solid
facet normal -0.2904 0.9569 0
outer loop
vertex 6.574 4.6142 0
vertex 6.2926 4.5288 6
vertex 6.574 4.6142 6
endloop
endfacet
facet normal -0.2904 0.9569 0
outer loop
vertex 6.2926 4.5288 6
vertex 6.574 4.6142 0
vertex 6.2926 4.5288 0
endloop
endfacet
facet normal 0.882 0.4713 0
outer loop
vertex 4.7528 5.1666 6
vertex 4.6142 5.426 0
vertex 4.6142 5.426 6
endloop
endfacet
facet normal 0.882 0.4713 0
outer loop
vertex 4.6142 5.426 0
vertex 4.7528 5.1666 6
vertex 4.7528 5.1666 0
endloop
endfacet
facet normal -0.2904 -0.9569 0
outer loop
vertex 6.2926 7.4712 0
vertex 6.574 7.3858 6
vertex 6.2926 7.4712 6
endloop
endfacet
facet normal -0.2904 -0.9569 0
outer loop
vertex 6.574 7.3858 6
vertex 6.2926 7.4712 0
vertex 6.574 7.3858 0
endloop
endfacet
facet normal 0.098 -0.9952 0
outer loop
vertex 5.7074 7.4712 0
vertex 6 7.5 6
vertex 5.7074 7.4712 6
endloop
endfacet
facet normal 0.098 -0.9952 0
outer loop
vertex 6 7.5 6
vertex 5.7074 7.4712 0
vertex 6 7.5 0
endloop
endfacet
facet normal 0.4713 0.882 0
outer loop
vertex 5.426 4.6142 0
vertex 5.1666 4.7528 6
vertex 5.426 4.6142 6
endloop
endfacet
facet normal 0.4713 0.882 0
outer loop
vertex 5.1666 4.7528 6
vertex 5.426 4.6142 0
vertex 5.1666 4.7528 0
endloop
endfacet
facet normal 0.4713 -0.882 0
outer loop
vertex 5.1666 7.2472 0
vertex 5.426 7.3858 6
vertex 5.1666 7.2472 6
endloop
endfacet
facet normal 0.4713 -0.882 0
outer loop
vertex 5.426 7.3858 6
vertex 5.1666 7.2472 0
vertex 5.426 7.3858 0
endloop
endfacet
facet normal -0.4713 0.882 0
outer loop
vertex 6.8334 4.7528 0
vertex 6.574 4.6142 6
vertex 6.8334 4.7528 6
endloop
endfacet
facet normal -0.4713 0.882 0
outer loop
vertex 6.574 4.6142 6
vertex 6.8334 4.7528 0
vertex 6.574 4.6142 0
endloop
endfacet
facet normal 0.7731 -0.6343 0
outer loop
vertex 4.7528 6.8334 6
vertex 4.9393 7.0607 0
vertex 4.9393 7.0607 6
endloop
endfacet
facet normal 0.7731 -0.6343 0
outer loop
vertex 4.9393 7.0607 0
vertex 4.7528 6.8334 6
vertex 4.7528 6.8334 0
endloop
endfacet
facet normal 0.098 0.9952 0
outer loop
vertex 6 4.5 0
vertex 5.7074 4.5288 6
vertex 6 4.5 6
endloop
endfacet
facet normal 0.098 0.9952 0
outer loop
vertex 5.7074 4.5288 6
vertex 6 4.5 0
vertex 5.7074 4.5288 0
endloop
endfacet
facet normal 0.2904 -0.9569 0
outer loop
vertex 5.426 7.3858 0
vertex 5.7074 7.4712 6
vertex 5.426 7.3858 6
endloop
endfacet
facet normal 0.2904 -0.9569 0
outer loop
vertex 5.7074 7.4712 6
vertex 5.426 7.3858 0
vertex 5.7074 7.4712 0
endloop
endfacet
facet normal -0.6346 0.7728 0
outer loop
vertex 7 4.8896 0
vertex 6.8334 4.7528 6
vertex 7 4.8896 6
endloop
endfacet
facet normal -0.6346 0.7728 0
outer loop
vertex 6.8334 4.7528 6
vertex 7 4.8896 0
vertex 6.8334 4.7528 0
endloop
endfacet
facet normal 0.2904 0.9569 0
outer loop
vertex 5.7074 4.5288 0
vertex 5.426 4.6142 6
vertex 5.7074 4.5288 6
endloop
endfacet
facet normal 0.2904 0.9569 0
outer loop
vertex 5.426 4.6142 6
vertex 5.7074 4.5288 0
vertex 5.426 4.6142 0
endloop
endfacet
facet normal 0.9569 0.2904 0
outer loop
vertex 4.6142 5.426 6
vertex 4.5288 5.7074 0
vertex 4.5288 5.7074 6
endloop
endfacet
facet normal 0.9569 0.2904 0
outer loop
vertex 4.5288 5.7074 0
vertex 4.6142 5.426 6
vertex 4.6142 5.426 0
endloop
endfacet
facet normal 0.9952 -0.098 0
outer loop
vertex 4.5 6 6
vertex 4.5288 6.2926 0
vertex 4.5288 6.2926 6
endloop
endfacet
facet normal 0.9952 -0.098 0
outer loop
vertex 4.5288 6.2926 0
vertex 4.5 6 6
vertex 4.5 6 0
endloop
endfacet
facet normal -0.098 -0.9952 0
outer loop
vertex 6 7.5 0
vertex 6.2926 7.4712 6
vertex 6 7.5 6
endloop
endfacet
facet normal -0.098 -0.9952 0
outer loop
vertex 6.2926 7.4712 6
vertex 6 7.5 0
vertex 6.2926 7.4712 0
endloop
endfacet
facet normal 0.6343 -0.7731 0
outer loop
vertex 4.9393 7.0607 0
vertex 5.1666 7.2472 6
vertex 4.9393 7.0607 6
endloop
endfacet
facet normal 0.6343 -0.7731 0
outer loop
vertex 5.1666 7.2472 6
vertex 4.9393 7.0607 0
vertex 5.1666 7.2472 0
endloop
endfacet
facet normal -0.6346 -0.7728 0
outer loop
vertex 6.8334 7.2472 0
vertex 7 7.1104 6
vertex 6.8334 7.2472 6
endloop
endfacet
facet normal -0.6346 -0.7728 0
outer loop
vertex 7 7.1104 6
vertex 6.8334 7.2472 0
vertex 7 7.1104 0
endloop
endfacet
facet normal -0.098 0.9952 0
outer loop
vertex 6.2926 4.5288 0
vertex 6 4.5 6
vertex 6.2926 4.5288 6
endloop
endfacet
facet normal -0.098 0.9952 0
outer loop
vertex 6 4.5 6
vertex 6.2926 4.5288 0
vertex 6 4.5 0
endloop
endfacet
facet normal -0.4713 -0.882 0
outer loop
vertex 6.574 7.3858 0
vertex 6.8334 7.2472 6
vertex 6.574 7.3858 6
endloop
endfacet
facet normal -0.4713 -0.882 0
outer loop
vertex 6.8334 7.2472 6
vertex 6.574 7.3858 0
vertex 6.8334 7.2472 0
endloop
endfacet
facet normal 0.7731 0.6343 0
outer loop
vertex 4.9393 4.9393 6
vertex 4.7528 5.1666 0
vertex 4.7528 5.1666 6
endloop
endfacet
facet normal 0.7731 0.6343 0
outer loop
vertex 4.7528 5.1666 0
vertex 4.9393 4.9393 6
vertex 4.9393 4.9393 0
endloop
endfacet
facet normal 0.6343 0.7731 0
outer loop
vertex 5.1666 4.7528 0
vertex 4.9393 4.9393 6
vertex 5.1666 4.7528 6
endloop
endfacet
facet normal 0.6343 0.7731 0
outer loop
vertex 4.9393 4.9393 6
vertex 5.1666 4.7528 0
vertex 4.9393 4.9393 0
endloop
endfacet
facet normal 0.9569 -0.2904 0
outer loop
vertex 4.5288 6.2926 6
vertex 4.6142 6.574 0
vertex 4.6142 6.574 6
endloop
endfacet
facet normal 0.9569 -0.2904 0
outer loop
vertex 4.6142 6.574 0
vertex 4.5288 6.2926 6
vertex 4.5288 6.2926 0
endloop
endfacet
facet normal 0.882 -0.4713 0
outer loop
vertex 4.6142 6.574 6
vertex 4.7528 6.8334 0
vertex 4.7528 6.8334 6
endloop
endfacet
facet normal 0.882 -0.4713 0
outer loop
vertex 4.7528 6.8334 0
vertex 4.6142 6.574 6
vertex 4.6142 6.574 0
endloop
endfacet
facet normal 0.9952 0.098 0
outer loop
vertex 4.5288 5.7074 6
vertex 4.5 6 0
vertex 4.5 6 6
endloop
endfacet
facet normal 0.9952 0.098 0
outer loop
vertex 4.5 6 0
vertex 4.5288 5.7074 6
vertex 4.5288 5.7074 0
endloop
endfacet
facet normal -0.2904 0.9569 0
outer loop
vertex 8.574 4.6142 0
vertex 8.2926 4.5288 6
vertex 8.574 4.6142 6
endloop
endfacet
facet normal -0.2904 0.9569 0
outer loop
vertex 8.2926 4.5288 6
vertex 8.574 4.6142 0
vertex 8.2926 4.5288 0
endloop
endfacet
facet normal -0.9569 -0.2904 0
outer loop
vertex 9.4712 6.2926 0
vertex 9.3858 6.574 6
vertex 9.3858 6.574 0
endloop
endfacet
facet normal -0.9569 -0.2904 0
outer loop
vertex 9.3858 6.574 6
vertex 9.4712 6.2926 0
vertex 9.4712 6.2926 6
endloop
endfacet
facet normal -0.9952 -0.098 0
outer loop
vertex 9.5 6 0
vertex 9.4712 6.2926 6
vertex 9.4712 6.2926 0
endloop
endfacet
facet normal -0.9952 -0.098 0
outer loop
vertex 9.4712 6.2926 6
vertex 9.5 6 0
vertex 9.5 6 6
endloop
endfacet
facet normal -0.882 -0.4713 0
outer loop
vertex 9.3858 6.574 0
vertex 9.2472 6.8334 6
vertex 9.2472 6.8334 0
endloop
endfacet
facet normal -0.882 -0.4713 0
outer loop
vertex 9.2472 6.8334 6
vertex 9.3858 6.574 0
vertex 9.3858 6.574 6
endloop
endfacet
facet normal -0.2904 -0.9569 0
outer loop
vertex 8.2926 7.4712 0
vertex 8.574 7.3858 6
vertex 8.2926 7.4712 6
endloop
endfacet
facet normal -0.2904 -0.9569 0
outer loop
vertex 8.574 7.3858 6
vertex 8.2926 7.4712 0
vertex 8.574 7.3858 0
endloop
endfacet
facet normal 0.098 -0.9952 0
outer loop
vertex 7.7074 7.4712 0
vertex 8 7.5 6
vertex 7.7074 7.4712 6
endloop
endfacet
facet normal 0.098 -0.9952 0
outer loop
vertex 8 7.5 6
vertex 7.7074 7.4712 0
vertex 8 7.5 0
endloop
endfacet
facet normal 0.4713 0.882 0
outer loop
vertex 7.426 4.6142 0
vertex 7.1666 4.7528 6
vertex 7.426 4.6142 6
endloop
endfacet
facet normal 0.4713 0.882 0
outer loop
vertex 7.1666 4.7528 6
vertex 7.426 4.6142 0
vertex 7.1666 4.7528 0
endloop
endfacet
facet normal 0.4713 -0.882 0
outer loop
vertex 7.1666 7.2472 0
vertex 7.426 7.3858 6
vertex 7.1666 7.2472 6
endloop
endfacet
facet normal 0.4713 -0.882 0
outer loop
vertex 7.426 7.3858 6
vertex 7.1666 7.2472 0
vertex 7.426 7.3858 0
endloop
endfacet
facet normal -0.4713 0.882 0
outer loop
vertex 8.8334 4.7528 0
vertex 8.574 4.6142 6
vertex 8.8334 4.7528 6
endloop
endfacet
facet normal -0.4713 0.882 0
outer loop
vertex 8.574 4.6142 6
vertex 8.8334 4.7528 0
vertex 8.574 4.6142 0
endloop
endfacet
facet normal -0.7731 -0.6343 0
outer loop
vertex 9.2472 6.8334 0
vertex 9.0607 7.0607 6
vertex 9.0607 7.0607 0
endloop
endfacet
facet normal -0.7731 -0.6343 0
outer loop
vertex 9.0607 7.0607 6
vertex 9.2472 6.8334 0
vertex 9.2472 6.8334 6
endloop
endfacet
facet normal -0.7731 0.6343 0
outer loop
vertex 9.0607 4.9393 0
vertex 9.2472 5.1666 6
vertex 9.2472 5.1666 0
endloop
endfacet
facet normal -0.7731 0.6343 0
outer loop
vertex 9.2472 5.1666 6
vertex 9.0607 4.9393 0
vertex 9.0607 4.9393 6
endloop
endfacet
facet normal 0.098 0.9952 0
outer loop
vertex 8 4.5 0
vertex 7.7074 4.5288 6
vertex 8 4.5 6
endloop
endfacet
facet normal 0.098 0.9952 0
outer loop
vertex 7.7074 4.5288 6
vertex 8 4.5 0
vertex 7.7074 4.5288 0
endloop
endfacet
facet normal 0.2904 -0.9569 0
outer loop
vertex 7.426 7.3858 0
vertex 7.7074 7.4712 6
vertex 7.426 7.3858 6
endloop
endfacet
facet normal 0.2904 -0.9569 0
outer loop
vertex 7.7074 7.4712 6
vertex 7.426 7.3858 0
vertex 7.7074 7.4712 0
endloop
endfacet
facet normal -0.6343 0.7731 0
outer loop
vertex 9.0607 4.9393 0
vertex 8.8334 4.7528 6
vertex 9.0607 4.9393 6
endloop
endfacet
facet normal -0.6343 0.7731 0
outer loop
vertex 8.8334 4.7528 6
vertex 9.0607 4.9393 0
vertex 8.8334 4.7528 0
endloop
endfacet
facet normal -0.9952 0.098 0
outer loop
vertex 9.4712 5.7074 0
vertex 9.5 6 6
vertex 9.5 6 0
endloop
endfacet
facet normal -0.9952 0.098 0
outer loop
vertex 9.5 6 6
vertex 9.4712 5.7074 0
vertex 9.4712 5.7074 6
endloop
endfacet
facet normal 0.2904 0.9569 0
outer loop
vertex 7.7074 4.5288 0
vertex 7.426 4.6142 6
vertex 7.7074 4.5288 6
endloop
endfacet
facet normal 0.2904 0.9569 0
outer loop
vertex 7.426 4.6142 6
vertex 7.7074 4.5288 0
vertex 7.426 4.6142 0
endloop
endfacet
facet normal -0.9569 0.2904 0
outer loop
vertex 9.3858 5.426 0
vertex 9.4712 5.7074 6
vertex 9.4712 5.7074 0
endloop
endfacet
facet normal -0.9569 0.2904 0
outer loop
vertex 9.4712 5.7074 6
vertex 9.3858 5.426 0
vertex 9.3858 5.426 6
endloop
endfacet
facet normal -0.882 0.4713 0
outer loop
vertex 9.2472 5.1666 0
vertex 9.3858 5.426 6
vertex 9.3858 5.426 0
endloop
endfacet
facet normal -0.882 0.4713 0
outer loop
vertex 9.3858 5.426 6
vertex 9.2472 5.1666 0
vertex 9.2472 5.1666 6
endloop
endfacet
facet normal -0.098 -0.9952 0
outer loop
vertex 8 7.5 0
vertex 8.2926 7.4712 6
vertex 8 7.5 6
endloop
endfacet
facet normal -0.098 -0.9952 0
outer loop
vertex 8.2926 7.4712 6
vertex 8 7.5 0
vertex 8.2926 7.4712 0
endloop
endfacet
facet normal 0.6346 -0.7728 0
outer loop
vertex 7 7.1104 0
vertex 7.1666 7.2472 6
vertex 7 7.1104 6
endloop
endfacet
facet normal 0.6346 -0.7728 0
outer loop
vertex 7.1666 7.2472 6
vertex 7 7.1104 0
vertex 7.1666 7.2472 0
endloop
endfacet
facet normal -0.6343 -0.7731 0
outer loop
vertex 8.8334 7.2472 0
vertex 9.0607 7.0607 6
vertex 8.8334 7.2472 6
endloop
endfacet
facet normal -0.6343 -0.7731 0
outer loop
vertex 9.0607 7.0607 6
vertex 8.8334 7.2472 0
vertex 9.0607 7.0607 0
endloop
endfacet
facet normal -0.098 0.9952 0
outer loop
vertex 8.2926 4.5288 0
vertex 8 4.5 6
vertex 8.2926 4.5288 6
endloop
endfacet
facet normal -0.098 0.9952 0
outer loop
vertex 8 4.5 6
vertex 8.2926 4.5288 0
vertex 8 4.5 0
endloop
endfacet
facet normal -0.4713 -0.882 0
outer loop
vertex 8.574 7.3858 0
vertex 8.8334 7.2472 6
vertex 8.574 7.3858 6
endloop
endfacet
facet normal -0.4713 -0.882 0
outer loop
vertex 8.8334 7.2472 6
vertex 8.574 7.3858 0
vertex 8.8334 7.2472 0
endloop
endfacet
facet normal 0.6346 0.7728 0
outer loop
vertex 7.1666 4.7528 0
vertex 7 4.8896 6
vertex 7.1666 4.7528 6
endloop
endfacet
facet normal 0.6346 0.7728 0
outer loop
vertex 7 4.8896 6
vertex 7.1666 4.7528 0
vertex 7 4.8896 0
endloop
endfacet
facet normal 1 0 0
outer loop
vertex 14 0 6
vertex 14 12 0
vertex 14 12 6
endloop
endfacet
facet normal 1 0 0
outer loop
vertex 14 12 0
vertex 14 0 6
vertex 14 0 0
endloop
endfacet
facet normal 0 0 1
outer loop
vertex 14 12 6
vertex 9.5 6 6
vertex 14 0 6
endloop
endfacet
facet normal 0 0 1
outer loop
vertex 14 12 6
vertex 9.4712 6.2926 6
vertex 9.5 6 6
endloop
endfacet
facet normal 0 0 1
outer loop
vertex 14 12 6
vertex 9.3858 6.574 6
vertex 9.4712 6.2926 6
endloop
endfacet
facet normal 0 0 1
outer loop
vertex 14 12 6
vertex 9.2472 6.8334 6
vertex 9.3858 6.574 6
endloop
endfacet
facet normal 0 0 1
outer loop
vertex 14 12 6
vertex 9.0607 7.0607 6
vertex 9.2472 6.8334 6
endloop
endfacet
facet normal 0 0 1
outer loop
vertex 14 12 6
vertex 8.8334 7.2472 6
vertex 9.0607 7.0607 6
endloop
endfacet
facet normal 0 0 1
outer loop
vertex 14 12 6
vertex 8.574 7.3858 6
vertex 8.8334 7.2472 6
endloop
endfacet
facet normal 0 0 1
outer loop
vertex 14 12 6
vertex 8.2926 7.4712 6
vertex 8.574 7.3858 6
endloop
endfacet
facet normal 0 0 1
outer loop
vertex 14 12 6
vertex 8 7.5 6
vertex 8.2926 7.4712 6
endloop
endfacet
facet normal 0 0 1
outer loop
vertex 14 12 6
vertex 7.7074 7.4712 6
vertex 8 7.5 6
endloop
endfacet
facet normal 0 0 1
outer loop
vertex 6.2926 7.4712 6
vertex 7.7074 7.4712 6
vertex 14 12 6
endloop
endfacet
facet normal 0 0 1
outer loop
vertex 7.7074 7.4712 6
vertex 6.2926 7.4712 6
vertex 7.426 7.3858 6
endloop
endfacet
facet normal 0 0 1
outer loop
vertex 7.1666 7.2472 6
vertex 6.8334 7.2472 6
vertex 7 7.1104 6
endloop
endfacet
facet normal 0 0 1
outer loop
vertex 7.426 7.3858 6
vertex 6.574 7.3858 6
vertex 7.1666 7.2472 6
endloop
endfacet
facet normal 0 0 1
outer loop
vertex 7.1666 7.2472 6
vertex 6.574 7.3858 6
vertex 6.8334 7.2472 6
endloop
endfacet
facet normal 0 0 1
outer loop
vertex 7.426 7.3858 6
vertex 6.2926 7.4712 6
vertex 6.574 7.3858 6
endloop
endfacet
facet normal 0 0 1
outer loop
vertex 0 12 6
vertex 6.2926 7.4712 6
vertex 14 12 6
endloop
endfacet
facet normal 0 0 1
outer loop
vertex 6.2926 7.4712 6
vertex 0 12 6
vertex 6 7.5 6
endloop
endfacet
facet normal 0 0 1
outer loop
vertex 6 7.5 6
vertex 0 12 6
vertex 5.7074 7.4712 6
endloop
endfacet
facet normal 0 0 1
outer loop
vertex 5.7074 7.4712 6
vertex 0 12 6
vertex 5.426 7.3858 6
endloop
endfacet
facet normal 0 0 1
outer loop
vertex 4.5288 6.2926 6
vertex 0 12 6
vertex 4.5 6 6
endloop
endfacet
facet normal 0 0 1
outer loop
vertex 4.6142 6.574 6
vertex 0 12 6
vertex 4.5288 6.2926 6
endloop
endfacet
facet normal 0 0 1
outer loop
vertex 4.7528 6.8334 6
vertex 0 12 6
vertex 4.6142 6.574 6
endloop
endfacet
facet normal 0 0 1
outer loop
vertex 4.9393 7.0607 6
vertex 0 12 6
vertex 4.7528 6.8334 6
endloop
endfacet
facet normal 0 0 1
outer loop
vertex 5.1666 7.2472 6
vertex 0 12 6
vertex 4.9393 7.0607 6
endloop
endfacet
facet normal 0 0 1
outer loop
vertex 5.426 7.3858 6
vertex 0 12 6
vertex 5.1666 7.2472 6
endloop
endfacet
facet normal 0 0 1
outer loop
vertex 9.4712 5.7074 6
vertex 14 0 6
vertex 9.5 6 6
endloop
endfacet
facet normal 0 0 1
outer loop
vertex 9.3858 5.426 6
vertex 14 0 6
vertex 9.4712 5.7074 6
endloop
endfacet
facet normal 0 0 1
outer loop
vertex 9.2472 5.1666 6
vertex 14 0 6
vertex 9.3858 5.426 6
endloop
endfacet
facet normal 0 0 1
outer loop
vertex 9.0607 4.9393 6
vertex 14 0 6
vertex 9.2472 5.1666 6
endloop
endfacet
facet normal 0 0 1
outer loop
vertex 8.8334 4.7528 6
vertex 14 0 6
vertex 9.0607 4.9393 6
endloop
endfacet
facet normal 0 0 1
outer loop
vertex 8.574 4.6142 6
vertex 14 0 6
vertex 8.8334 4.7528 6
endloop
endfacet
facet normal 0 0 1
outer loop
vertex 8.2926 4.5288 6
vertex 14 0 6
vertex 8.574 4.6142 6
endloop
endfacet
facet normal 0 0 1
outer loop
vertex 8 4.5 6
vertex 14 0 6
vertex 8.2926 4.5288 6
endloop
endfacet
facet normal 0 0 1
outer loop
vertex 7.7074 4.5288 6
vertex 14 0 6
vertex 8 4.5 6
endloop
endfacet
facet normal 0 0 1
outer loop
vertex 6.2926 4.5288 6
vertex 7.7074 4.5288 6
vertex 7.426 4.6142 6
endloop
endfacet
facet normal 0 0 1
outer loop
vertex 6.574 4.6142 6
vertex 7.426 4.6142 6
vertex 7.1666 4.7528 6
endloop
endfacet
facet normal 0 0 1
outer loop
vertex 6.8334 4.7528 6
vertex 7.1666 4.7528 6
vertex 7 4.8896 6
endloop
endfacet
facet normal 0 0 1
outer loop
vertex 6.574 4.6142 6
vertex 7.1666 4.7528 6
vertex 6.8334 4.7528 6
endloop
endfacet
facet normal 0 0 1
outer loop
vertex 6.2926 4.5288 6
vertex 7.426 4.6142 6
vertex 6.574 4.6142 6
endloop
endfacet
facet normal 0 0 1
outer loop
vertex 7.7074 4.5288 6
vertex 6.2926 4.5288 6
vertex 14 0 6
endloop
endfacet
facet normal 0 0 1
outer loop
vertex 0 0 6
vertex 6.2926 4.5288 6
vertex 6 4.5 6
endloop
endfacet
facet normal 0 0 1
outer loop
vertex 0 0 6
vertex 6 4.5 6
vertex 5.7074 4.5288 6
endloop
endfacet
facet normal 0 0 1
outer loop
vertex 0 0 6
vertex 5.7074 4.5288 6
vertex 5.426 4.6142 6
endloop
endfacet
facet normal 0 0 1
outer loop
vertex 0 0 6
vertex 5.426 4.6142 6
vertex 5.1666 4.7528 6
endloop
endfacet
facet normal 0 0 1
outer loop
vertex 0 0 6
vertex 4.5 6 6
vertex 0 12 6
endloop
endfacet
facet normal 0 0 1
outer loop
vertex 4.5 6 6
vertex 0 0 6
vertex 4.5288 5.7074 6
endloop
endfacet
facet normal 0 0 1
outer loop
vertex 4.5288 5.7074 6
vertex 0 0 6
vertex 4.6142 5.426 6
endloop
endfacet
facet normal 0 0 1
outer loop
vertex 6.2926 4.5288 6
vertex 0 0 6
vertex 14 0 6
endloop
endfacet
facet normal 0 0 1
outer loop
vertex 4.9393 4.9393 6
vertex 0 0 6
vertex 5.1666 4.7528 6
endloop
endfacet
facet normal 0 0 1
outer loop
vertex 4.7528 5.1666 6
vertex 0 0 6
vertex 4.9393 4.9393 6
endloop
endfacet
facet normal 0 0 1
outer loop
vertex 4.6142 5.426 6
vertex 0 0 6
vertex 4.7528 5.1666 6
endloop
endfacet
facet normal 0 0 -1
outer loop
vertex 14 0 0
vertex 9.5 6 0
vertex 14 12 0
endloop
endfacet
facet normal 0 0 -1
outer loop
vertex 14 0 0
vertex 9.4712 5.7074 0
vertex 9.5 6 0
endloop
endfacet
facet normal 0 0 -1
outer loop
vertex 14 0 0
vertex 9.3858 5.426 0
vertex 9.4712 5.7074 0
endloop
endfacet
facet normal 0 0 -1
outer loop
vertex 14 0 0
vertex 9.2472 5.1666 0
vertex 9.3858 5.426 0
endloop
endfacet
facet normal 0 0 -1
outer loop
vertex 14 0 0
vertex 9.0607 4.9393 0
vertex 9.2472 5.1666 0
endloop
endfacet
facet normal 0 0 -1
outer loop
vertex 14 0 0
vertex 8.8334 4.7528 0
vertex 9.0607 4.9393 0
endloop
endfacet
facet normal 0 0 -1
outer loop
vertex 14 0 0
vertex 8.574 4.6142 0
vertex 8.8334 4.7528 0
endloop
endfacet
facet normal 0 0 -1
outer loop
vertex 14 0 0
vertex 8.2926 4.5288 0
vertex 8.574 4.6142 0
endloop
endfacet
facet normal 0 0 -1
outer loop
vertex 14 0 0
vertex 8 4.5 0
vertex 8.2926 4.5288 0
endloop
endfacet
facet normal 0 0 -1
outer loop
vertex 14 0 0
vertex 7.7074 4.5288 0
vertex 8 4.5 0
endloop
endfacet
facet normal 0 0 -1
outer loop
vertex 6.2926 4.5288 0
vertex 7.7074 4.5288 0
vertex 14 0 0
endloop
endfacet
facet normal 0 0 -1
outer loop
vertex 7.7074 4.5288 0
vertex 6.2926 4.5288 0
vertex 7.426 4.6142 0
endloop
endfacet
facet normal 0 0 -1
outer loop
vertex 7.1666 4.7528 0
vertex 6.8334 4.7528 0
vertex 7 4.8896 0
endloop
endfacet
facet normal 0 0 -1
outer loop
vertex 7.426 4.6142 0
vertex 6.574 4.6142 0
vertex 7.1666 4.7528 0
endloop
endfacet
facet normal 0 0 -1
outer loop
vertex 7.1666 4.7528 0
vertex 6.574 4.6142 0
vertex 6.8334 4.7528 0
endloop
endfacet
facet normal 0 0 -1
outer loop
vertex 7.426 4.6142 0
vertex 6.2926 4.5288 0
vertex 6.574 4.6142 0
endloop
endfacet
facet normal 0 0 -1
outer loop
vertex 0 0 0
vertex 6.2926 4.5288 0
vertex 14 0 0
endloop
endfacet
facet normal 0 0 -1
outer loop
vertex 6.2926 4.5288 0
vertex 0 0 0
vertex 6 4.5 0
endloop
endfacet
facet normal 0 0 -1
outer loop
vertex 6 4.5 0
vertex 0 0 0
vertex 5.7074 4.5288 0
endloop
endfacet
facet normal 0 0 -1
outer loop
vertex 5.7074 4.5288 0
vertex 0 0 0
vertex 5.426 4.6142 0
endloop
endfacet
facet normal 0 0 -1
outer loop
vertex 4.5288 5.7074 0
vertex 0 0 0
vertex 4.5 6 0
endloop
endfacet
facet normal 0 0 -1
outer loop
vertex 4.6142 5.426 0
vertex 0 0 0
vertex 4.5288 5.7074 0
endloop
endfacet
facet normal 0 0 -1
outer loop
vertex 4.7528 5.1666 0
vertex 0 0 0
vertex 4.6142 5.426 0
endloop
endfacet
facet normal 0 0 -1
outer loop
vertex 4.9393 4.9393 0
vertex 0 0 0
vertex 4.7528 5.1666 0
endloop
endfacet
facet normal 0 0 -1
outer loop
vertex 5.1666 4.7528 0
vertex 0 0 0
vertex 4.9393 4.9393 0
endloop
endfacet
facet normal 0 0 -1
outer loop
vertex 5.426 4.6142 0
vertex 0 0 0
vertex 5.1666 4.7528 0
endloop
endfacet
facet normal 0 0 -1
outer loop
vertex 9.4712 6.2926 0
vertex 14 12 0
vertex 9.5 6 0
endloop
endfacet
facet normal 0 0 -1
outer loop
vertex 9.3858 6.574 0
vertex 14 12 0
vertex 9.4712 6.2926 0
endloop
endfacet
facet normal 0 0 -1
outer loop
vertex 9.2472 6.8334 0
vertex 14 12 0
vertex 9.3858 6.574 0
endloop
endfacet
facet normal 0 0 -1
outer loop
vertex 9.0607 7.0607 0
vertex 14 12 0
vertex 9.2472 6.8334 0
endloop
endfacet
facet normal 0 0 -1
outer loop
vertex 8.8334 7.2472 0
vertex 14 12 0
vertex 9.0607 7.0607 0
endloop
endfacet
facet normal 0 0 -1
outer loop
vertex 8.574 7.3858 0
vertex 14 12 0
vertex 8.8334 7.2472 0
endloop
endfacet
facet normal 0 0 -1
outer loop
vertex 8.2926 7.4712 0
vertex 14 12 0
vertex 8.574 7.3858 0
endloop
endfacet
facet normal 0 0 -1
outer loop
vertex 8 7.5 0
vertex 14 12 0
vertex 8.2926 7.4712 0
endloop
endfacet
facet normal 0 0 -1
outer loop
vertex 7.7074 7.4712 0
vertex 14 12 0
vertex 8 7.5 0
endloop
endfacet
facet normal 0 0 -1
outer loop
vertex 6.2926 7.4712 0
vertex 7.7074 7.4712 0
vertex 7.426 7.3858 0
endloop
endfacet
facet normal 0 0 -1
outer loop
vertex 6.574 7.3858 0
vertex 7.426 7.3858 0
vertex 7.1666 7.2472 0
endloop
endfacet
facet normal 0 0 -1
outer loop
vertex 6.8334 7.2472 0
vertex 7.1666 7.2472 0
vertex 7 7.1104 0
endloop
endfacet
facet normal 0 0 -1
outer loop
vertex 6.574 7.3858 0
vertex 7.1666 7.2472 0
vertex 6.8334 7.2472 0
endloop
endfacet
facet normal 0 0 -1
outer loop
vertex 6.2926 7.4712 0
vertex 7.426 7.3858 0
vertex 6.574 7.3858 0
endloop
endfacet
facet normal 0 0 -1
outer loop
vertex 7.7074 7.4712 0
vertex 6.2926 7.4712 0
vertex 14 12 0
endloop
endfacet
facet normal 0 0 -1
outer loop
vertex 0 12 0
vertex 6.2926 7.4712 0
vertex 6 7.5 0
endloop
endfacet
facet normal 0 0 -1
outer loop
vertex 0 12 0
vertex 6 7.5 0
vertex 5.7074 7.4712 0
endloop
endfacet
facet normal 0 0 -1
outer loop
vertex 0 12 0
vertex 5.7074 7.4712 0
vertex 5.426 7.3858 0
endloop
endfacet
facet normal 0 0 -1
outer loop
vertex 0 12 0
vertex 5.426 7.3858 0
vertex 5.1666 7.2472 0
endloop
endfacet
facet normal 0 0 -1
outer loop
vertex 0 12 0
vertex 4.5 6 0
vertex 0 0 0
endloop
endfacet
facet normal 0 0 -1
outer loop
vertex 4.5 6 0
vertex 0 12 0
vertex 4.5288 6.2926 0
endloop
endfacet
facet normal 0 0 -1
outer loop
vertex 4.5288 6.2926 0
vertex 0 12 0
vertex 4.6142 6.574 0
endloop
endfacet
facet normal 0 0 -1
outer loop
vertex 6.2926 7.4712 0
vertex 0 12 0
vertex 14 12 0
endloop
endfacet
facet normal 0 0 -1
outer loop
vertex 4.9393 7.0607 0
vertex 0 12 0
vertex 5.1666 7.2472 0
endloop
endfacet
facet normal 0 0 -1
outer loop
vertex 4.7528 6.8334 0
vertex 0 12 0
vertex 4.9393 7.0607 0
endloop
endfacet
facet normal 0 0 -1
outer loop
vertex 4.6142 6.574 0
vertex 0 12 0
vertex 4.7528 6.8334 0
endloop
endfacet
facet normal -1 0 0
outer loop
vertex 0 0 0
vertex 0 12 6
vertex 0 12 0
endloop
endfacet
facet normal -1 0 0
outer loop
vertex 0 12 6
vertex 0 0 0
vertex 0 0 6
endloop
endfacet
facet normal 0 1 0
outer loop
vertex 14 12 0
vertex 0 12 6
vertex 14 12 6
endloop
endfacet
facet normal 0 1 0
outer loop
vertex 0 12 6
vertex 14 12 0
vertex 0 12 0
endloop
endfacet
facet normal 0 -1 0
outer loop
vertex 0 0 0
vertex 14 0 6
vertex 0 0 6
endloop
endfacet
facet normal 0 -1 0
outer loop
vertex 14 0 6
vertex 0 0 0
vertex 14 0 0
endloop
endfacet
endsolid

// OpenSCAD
$fn = 32;

// ----------------------------------------------------------------------
// Micro pad: two-hole pad, 5-20 mm class
// ----------------------------------------------------------------------

// --- parameters (mm) ---
pad_l = 14;               // pad length, X
pad_w = 12;               // pad width, Y
pad_t = 6;                // pad thickness, Z
hole_d = 3;               // hole diameter
hole_x = 6;               // X of the first hole centre

difference() {
  cube([pad_l, pad_w, pad_t]);
  for (x = [hole_x, pad_l - hole_x])
    translate([x, pad_w / 2, -1])
      cylinder(h = pad_t + 2, d = hole_d);
}
